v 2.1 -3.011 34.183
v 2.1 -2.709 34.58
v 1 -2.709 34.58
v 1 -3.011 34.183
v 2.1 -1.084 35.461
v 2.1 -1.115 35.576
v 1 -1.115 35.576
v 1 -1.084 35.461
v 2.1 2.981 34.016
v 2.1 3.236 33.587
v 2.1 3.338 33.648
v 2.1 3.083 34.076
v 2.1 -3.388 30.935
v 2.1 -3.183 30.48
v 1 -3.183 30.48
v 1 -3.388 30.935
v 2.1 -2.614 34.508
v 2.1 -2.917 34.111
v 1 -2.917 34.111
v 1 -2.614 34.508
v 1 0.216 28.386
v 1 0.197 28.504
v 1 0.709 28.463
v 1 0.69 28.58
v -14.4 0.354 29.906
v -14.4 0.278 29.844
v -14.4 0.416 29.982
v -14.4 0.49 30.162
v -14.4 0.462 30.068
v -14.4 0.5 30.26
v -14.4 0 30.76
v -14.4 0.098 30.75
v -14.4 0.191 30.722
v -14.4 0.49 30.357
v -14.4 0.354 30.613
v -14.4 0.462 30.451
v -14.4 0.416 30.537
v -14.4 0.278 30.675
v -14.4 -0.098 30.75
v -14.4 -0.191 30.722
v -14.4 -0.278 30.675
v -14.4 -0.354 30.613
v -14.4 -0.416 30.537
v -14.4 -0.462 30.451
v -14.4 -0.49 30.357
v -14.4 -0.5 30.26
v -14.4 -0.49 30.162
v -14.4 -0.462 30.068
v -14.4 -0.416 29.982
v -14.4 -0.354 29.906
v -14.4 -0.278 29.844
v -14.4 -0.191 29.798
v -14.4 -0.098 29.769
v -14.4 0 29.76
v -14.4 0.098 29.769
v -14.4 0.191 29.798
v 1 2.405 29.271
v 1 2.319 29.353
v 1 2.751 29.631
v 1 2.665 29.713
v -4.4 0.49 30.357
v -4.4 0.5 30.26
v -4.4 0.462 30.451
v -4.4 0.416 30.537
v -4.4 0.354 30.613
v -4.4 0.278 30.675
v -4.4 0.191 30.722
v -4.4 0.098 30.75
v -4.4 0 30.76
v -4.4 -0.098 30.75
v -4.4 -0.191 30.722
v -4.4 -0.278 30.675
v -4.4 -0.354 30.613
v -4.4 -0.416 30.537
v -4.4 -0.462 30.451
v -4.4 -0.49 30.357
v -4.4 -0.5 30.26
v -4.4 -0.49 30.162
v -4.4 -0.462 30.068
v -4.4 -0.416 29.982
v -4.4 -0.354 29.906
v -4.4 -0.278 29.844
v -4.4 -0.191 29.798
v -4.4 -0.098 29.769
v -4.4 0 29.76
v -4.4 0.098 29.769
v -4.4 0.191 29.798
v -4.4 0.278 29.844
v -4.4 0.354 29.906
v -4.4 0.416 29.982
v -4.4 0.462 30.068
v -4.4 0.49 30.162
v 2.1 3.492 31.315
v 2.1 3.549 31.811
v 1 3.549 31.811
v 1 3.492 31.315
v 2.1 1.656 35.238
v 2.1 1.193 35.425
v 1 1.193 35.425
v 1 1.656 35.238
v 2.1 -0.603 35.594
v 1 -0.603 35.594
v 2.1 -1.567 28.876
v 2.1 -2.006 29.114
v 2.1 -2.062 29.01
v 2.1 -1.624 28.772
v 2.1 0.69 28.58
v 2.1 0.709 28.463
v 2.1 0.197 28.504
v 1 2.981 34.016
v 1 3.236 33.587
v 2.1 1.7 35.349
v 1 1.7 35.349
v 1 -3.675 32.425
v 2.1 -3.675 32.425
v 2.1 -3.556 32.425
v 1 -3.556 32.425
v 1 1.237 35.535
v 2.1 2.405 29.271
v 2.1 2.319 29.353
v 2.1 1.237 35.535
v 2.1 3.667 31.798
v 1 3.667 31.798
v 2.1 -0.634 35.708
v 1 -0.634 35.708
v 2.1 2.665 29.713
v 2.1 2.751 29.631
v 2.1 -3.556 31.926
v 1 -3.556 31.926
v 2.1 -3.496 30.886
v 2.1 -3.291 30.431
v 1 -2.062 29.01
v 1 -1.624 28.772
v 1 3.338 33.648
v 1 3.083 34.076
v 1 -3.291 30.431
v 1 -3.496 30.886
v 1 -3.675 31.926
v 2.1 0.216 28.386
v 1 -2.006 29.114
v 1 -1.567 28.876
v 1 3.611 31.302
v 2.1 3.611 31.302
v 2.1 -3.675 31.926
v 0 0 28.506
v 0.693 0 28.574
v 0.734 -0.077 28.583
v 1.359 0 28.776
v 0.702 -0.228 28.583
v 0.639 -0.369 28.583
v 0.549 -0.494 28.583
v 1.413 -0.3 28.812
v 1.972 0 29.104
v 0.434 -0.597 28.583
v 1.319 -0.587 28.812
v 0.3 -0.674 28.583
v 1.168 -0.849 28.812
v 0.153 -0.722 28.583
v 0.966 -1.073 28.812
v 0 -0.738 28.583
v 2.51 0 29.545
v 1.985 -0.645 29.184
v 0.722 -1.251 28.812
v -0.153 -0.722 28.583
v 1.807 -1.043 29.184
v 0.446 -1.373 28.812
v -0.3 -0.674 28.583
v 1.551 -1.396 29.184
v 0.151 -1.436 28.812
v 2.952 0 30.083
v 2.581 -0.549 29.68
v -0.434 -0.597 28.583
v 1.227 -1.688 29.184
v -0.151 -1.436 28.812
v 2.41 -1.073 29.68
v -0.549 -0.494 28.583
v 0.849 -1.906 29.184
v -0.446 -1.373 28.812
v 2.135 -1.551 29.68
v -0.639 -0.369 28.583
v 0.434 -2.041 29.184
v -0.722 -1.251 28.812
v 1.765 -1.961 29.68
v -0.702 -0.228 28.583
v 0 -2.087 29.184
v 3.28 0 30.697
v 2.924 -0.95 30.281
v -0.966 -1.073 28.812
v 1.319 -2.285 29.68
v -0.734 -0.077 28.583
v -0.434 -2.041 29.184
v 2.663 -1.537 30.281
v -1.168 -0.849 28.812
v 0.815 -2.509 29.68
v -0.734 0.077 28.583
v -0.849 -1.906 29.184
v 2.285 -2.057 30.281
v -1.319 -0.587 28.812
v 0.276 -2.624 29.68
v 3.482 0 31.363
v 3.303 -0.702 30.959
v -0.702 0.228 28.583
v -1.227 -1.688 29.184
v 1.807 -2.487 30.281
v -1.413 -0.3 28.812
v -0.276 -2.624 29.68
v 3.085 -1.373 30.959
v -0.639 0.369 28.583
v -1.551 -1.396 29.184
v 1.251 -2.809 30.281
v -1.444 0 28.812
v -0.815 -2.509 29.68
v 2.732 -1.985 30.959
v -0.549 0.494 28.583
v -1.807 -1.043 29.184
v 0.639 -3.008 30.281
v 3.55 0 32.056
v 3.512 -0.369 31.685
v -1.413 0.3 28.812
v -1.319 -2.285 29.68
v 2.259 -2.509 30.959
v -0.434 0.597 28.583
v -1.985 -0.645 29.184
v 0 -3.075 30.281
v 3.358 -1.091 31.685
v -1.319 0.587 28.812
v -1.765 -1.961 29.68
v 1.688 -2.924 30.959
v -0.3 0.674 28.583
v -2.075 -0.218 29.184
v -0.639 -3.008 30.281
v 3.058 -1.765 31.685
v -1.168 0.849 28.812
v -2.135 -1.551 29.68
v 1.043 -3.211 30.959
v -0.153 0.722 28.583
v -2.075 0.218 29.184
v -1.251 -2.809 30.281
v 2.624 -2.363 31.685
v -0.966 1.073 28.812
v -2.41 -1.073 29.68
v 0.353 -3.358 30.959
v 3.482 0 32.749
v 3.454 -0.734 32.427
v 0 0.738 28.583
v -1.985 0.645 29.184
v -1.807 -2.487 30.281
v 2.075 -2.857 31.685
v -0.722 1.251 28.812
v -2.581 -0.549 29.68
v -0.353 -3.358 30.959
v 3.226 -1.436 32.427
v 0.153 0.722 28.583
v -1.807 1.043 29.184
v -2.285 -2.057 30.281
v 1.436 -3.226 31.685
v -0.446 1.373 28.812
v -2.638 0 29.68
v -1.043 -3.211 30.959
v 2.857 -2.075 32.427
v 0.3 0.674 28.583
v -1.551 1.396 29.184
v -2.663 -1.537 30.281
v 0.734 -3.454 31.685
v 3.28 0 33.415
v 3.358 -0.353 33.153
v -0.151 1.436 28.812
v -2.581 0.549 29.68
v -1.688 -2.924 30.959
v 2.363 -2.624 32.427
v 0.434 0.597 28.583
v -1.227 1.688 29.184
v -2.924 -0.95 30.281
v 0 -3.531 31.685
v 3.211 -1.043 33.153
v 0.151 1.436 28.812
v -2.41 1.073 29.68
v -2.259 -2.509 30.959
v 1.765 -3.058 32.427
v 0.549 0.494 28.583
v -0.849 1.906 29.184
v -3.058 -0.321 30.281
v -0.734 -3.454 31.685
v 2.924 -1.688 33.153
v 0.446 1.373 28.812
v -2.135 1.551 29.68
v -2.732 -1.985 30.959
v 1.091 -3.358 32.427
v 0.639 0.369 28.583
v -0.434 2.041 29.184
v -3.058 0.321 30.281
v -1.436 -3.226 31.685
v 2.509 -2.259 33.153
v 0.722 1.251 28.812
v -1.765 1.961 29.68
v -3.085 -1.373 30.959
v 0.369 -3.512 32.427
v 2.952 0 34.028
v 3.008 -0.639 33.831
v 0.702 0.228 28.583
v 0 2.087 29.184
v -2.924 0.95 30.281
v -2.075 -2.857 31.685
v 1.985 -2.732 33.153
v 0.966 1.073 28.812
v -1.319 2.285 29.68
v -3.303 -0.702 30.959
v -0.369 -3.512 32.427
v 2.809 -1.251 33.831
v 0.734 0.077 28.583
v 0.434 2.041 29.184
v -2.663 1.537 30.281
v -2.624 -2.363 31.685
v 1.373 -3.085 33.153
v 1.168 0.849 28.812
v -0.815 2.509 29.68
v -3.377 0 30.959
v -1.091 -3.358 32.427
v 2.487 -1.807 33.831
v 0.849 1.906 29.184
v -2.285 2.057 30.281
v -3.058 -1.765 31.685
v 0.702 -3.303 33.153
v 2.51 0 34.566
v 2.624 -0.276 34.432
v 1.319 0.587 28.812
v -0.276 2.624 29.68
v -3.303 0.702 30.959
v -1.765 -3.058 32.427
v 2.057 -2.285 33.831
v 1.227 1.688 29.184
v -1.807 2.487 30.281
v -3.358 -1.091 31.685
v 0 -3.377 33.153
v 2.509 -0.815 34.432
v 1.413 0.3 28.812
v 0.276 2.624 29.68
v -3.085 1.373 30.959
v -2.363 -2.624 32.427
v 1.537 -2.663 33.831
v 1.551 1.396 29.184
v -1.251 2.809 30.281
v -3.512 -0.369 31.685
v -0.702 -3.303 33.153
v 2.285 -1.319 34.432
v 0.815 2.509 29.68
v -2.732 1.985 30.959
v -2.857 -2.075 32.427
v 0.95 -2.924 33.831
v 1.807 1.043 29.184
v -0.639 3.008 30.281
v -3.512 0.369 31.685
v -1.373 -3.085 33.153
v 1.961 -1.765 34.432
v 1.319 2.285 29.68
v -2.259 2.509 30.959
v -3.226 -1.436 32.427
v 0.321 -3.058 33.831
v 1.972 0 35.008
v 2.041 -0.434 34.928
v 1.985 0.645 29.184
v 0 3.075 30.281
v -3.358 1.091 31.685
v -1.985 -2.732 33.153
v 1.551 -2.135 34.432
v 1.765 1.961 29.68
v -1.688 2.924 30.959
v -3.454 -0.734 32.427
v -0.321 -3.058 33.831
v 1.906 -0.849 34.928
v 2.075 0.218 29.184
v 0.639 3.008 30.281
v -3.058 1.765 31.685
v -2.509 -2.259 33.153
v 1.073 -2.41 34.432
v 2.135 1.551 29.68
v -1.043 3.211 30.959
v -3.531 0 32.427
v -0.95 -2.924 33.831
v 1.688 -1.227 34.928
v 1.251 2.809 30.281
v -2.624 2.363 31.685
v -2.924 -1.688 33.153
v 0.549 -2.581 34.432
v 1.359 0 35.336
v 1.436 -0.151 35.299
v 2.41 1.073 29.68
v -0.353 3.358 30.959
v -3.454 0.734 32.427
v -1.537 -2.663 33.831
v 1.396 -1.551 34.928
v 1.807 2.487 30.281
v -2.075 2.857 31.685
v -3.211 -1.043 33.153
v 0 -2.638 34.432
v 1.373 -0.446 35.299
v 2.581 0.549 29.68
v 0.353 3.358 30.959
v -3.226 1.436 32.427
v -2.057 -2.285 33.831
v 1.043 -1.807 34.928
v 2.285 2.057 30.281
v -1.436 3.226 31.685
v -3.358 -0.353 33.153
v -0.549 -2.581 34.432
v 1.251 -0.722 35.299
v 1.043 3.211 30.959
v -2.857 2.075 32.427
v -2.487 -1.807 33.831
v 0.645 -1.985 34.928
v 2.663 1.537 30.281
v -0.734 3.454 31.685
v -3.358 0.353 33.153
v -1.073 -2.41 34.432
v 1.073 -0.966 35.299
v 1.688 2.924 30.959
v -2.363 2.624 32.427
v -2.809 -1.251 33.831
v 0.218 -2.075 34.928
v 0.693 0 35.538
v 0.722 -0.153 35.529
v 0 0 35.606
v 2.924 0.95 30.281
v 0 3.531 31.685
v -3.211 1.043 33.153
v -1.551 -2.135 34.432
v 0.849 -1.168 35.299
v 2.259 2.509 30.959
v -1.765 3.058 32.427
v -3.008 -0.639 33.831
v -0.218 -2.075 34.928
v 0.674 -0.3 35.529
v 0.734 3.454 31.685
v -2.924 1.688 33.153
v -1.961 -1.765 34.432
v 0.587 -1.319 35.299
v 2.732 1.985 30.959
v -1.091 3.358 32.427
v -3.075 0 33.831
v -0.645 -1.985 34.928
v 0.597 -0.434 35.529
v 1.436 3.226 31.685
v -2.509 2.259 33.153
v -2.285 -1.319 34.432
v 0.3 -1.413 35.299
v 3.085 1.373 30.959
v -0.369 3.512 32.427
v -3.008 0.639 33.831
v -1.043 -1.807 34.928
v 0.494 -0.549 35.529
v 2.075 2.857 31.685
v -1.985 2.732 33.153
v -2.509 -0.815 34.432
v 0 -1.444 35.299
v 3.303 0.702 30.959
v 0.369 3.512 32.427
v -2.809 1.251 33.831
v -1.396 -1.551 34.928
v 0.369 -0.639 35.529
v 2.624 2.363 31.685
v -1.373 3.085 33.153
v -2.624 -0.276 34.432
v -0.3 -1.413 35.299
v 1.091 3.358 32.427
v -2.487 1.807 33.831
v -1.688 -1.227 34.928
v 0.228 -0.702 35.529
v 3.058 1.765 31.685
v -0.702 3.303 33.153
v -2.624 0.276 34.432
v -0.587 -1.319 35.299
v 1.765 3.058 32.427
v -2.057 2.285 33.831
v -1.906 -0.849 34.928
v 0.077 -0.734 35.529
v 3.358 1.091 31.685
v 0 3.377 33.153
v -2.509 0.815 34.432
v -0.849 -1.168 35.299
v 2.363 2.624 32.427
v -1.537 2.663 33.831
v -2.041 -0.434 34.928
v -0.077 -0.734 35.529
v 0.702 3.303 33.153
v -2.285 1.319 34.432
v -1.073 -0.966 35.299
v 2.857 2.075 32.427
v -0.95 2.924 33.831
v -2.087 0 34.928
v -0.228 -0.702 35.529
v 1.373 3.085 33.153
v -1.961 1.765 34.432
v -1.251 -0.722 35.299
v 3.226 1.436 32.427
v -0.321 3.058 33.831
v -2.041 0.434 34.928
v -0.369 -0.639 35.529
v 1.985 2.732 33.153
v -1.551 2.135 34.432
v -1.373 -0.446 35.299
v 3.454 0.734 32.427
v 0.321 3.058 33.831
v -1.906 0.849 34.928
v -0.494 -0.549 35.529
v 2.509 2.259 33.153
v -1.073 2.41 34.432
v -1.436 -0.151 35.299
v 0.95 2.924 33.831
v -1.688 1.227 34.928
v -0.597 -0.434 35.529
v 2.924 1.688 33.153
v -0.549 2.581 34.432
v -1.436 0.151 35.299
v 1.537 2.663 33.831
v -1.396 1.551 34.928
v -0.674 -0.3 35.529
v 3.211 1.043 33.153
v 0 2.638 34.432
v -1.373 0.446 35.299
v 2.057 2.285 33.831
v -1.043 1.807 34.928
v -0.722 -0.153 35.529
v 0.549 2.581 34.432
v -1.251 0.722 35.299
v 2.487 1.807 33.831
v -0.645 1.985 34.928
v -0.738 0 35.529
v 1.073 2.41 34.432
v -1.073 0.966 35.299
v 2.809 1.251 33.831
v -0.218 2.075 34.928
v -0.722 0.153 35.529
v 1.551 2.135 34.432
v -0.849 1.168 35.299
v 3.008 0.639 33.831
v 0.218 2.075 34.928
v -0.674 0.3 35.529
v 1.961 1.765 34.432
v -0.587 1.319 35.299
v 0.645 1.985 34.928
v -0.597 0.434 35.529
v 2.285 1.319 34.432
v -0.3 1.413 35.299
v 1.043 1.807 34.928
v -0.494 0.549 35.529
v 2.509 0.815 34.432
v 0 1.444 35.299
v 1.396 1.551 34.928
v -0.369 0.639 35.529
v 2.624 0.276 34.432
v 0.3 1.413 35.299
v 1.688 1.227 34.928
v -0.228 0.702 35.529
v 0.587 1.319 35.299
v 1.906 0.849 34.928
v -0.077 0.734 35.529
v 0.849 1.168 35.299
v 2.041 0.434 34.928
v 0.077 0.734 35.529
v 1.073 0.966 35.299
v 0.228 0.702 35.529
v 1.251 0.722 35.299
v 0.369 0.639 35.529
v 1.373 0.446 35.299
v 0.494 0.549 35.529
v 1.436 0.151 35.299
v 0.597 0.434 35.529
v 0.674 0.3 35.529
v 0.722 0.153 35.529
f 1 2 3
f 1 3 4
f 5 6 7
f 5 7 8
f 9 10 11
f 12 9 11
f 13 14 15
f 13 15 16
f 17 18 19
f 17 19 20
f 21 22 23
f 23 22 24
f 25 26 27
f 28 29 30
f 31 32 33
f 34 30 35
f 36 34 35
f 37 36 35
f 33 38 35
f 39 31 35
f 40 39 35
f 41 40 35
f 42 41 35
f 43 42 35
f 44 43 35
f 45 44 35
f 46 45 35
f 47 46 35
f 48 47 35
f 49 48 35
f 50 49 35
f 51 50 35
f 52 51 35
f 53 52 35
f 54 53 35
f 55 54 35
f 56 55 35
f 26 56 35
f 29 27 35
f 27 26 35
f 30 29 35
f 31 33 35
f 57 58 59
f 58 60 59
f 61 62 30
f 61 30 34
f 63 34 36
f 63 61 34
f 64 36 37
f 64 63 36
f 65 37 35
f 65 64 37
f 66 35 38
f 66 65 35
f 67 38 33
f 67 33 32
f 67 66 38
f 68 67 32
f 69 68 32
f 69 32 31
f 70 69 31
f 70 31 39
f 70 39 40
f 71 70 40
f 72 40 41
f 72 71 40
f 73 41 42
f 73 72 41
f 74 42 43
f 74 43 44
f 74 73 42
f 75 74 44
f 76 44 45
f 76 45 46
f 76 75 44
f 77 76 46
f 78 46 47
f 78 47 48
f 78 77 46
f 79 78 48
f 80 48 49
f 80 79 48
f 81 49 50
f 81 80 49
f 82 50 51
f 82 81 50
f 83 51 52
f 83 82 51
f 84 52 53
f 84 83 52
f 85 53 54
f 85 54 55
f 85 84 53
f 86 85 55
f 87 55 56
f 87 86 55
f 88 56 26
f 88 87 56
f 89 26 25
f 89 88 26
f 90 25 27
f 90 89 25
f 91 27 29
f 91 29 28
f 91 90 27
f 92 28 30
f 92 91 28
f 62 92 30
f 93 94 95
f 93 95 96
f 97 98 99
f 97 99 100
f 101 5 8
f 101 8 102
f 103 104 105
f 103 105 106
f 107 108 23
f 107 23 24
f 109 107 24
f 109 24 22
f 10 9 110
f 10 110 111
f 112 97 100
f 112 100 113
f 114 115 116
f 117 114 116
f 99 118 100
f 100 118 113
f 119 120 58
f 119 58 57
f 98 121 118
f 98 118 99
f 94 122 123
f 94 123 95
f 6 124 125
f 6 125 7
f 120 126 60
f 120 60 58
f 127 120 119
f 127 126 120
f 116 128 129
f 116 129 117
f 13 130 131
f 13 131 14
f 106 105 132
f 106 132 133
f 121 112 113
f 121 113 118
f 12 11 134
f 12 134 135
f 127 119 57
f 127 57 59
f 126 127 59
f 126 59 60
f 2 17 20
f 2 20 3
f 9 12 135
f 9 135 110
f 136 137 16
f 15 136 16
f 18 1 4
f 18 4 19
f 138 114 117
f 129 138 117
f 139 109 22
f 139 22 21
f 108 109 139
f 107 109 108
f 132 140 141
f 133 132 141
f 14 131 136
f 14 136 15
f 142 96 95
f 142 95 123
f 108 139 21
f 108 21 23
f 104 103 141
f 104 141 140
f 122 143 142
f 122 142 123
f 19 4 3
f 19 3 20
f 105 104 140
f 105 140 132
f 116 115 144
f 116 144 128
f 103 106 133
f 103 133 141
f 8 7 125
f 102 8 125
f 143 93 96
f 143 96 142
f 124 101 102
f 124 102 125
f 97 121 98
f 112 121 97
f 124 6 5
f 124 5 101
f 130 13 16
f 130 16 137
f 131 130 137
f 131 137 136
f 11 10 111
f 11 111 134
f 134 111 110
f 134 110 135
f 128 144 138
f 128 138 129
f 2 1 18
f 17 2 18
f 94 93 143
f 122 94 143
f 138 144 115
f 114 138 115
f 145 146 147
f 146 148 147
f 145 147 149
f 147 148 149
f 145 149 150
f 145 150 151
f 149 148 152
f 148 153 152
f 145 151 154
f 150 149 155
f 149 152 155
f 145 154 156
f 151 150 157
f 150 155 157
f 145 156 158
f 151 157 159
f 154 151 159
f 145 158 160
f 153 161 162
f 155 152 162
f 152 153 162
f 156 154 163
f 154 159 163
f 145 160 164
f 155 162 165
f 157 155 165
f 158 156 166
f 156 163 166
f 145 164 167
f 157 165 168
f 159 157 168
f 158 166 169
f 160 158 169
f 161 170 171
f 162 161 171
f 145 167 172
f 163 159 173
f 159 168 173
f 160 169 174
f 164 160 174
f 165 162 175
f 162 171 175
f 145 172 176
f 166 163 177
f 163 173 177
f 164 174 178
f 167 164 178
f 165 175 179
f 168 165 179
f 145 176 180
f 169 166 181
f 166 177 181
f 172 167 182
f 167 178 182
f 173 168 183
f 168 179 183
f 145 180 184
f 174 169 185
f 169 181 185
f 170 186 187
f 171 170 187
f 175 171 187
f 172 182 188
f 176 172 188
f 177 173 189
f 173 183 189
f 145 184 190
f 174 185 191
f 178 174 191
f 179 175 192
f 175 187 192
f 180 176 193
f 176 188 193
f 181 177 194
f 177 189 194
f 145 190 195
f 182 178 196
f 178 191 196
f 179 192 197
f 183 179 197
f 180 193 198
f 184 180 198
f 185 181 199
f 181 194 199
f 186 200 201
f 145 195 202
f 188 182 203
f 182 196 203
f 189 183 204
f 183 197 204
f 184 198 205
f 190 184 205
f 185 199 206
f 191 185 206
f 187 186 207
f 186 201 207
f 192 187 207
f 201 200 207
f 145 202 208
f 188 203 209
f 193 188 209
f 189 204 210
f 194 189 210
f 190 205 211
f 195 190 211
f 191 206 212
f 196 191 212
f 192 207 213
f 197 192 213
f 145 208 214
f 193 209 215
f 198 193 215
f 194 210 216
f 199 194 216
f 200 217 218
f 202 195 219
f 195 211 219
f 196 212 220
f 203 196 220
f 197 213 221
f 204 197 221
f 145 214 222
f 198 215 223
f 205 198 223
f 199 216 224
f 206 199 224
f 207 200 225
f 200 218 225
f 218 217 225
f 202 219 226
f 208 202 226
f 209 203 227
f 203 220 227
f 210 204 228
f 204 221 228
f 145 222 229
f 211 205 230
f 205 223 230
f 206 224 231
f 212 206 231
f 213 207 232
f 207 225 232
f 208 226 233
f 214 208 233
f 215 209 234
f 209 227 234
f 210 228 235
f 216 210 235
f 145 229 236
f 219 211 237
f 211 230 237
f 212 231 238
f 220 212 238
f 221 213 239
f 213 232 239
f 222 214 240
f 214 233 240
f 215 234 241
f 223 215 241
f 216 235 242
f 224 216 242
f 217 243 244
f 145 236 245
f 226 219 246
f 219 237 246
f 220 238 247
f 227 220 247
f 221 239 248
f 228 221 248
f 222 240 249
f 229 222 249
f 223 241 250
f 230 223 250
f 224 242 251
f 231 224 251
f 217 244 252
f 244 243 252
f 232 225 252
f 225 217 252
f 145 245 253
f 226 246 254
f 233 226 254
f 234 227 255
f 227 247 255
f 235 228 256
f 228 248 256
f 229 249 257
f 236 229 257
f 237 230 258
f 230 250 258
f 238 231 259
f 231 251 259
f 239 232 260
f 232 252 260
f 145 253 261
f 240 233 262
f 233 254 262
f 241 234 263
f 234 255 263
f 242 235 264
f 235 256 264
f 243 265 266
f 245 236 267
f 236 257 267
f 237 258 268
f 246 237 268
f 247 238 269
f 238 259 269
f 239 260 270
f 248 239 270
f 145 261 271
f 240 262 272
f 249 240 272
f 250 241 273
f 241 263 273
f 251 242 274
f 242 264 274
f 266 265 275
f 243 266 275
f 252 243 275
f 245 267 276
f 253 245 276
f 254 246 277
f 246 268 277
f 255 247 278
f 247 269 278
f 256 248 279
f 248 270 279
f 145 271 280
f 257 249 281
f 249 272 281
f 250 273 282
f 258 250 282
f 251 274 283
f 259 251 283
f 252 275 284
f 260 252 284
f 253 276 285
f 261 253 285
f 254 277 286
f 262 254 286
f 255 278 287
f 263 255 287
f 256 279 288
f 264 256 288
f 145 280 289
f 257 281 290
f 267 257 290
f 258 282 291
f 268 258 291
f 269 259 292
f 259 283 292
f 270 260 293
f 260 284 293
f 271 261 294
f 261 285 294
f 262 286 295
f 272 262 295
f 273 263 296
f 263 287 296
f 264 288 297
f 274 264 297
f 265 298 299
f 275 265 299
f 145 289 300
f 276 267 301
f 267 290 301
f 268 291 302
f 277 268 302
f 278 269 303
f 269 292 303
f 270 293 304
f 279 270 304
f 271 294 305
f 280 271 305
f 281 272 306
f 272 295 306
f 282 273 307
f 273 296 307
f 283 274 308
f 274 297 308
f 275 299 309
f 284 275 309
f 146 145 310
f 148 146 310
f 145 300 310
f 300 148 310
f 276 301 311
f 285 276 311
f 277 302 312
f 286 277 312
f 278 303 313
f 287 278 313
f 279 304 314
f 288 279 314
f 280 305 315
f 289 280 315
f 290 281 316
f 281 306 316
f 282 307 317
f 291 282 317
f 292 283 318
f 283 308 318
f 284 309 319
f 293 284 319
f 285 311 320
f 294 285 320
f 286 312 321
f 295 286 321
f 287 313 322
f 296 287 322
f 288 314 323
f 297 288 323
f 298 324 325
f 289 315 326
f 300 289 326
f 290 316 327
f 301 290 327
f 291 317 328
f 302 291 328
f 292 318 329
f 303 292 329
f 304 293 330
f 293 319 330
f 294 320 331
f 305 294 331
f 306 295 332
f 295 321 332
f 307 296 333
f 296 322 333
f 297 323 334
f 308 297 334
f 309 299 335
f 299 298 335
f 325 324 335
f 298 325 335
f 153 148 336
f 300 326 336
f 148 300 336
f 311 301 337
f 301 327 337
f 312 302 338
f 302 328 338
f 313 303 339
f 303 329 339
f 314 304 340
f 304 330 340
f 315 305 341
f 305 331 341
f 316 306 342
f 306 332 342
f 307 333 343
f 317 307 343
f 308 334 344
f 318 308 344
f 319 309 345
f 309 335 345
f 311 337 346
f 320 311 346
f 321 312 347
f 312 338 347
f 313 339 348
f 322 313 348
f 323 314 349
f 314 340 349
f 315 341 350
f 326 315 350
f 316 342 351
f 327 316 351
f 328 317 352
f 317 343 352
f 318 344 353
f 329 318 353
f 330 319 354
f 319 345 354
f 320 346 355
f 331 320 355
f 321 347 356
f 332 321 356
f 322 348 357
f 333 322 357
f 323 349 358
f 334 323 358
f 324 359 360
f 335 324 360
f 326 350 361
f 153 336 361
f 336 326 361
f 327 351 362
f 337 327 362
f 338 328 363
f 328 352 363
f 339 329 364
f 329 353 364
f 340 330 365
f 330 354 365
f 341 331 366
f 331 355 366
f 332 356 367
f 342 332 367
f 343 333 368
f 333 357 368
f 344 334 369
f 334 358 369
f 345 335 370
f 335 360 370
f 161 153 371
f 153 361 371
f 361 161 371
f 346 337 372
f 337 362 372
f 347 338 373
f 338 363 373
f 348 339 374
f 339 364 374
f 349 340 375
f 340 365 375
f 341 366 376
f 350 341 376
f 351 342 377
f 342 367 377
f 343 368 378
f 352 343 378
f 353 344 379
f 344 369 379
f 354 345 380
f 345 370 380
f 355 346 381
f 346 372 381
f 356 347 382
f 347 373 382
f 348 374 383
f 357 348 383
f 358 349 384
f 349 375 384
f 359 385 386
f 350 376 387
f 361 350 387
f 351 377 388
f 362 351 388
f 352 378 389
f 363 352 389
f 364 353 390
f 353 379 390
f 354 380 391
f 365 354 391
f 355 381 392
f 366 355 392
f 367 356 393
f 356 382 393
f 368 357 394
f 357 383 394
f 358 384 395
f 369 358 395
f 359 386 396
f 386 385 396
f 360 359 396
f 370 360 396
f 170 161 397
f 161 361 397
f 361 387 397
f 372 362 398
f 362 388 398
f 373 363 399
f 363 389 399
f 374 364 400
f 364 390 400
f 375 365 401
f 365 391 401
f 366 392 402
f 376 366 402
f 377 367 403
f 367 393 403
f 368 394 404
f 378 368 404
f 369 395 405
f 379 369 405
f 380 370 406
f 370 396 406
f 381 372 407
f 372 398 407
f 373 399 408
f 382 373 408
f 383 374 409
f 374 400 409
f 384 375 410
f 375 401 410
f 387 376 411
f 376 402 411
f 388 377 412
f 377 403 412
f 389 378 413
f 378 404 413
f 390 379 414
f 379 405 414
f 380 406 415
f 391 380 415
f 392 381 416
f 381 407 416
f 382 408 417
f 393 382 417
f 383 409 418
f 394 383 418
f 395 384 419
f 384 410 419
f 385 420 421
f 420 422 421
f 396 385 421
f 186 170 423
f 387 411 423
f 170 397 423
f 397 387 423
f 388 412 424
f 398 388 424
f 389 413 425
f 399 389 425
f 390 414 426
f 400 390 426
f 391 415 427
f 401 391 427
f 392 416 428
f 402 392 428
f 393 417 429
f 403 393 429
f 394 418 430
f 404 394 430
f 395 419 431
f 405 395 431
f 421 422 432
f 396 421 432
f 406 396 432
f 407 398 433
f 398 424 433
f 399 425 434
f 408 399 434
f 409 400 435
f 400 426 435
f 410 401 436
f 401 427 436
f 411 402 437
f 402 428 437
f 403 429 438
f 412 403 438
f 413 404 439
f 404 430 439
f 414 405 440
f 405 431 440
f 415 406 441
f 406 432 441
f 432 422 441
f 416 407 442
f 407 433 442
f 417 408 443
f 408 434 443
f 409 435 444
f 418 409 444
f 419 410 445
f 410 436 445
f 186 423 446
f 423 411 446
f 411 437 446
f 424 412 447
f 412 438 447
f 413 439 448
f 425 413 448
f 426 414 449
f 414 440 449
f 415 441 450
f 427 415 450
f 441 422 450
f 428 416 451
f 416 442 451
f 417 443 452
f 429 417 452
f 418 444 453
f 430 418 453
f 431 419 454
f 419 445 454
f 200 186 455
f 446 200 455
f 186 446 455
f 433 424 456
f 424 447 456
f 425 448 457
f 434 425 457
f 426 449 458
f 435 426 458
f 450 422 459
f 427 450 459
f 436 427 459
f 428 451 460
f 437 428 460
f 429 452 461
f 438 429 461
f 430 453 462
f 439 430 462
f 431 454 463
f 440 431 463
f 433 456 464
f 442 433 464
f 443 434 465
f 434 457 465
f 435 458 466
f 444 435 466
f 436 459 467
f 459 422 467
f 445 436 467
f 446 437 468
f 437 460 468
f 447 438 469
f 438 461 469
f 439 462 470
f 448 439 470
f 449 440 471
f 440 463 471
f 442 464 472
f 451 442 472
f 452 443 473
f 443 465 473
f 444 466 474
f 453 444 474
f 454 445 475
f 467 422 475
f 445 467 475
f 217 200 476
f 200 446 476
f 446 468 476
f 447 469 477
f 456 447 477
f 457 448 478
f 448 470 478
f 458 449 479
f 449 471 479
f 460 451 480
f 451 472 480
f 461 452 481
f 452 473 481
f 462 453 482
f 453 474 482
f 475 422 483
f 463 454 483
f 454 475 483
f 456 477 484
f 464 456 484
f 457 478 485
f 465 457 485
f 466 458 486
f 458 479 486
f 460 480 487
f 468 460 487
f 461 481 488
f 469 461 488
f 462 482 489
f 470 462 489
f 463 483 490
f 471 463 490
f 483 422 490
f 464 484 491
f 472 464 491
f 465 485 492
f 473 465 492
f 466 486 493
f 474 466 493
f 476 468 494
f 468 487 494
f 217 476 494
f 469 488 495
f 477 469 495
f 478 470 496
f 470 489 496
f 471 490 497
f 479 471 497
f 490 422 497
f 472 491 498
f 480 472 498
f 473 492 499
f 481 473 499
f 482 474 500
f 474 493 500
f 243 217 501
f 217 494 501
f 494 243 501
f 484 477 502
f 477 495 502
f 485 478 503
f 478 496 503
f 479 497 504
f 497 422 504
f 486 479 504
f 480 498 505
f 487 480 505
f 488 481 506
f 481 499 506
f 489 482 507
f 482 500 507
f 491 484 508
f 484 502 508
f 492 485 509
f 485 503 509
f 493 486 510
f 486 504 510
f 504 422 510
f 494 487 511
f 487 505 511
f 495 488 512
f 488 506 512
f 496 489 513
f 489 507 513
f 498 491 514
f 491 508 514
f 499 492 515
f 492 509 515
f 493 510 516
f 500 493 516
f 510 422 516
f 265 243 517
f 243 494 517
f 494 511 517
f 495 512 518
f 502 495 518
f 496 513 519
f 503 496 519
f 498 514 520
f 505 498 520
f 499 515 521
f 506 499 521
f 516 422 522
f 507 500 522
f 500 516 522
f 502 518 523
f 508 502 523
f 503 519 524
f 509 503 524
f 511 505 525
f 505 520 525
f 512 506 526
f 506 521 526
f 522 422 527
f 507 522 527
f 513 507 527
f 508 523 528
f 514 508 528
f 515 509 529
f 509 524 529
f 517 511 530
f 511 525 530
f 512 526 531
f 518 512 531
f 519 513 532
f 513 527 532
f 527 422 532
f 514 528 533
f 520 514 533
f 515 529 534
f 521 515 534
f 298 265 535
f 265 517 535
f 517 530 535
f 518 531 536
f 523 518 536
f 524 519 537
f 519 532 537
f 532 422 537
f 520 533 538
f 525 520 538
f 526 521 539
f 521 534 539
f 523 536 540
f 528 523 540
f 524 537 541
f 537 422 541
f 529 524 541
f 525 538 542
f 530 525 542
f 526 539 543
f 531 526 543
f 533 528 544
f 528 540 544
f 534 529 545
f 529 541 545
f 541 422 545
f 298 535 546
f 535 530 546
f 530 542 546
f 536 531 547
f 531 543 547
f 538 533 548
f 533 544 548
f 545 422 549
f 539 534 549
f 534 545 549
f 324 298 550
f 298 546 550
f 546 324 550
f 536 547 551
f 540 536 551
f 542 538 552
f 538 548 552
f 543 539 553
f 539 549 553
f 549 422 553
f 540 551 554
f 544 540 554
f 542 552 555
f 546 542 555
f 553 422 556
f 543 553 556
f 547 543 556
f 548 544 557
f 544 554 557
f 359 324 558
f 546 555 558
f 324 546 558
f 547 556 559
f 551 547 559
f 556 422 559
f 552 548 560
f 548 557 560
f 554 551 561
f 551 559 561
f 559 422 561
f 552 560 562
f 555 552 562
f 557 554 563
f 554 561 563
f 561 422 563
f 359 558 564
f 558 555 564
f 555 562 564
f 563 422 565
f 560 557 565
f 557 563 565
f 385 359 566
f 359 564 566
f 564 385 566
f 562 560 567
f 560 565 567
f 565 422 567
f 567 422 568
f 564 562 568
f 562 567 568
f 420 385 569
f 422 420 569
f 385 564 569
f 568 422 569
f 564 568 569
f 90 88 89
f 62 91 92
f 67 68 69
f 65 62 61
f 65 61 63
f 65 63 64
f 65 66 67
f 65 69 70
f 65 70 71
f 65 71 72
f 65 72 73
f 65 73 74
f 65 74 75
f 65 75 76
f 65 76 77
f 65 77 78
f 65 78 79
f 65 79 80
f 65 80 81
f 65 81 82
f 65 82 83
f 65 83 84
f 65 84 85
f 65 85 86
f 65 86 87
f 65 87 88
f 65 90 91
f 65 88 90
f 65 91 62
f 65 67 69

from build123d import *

# Parameters (mm, degrees)
F3_R     = 0.5
F4_DEPTH = 10
F8_W     = 0.118814
F8_H     = 0.499018
F9_DEPTH = 1.1


with BuildPart() as f1:
    # F0 (on Front) → F1 (revolve)
    with BuildSketch(Plane.XZ):
        with BuildLine():
            ThreePointArc((0, 28.505525), (3.550359, 32.055884), (0, 35.606243))
            Line((0, 35.606243), (0, 28.505525))
        make_face()
    revolve(axis=Axis((0, 0, 32.055884), (0, 0, -1)))


with BuildPart() as f4:
    # F3 (on offset) → F4 (new body)
    with BuildSketch(Plane.YZ.offset(-4.4)):
        with Locations((0, 30.259646)):
            Circle(F3_R)
    extrude(amount=-F4_DEPTH)


with BuildPart() as f9:
    # F8 (on offset) → F9 (new body)
    with BuildSketch(Plane.YZ.offset(2.1)):
        with Locations((-3.615286, 32.175526)):
            Rectangle(F8_W, F8_H)
        Polygon((-2.614079, 34.507953), (-2.708583, 34.579967), (-3.01104, 34.183056), (-2.916536, 34.111043), align=None)
        Polygon((-0.60252, 35.593847), (-0.634038, 35.708404), (-1.115178, 35.576028), (-1.083659, 35.46147), align=None)
        Polygon((1.655609, 35.238334), (1.699974, 35.348555), (1.237049, 35.534885), (1.192684, 35.424664), align=None)
        Polygon((3.236213, 33.586902), (3.338305, 33.64768), (3.083037, 34.076466), (2.980945, 34.015687), align=None)
        Polygon((3.49246, 31.315366), (3.610501, 31.30183), (3.667354, 31.797598), (3.549313, 31.811135), align=None)
        Polygon((2.319487, 29.353309), (2.40517, 29.270997), (2.750878, 29.630865), (2.665194, 29.713177), align=None)
        Polygon((0.19731, 28.503662), (0.215571, 28.38626), (0.708659, 28.462958), (0.690398, 28.580361), align=None)
        Polygon((-2.005613, 29.114128), (-2.062246, 29.00968), (-1.623564, 28.771821), (-1.566931, 28.87627), align=None)
        Polygon((-3.387778, 30.934885), (-3.49613, 30.886134), (-3.291376, 30.431058), (-3.183024, 30.479809), align=None)
    extrude(amount=-F9_DEPTH)


solid = Compound([f1.part, f4.part, f9.part])
